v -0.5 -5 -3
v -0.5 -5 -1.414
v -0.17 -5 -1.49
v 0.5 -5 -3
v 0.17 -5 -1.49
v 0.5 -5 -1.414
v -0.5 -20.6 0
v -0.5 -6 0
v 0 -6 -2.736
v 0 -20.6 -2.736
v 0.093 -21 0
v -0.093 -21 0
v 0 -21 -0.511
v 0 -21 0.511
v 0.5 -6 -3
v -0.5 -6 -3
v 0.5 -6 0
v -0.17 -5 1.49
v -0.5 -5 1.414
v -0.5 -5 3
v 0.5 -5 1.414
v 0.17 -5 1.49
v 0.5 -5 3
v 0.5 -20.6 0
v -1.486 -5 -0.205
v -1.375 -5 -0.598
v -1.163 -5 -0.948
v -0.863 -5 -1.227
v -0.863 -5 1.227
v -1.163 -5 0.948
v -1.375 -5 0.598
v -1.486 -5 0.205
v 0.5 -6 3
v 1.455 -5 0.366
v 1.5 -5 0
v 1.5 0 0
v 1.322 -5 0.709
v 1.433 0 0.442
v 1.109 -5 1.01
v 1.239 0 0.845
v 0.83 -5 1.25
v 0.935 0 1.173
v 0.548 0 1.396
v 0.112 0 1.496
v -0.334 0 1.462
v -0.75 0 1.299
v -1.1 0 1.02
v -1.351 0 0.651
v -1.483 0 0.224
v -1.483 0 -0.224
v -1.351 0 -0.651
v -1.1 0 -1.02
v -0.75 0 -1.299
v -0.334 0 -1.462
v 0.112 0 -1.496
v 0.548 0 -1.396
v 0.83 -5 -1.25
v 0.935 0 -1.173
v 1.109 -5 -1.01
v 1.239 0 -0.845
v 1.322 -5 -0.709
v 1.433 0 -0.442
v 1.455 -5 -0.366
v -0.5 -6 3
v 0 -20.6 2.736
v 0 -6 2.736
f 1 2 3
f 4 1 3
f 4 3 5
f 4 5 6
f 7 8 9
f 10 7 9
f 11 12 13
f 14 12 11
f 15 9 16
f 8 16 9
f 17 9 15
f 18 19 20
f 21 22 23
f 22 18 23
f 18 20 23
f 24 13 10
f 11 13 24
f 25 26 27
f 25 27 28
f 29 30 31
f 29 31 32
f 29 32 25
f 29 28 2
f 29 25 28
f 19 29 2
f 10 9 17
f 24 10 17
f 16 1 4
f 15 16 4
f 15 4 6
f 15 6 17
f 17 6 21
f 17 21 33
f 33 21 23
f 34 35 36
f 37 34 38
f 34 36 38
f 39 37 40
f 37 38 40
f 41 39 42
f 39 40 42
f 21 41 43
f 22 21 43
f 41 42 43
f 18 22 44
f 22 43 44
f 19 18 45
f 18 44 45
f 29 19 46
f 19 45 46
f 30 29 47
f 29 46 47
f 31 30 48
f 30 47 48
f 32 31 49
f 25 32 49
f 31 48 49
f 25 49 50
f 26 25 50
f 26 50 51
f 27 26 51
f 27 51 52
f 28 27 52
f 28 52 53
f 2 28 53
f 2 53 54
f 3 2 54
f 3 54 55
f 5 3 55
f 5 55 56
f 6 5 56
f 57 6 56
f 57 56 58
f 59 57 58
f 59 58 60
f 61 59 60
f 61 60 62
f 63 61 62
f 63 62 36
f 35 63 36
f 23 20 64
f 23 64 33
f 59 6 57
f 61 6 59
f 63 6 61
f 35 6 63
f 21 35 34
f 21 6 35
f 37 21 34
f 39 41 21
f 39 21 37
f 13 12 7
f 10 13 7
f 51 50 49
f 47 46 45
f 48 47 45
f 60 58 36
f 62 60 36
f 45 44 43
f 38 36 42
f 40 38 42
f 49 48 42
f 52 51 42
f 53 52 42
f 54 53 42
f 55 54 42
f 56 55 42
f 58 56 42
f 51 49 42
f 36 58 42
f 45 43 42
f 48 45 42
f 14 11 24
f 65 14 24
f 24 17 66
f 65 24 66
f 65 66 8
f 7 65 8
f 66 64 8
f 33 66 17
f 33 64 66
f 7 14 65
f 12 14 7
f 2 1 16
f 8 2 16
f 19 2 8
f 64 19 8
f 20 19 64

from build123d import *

# Parameters (mm, degrees)
F0_R     = 1.5
F1_DEPTH = 5
F2_W     = 1
F2_H     = 6
F3_DEPTH = 1
F5_DEPTH = 15
F6_SIZE  = 0.4


with BuildPart() as f1:
    # F0 (on Front) → F1 (new body)
    with BuildSketch(Plane.XZ):
        Circle(F0_R)
    extrude(amount=F1_DEPTH)

    # F2 (on face) → F3 (join)
    with BuildSketch(Plane.XZ.offset(5)):
        Rectangle(F2_W, F2_H)
    extrude(amount=F3_DEPTH)

    # F4 (on face) → F5 (join)
    with BuildSketch(Plane.XZ.offset(6)):
        Polygon((0, 2.735806), (-0.5, 0), (0, -2.735806), (0.5, 0), align=None)
    extrude(amount=F5_DEPTH)

    # F6
    f6_edges = [f1.edges().sort_by_distance(p)[0] for p in [
        (0.25, -21, 1.367903),
        (0.25, -21, -1.367903),
        (-0.25, -21, 1.367903),
        (-0.25, -21, -1.367903),
    ]]
    chamfer(f6_edges, length=F6_SIZE)


solid = f1.part
